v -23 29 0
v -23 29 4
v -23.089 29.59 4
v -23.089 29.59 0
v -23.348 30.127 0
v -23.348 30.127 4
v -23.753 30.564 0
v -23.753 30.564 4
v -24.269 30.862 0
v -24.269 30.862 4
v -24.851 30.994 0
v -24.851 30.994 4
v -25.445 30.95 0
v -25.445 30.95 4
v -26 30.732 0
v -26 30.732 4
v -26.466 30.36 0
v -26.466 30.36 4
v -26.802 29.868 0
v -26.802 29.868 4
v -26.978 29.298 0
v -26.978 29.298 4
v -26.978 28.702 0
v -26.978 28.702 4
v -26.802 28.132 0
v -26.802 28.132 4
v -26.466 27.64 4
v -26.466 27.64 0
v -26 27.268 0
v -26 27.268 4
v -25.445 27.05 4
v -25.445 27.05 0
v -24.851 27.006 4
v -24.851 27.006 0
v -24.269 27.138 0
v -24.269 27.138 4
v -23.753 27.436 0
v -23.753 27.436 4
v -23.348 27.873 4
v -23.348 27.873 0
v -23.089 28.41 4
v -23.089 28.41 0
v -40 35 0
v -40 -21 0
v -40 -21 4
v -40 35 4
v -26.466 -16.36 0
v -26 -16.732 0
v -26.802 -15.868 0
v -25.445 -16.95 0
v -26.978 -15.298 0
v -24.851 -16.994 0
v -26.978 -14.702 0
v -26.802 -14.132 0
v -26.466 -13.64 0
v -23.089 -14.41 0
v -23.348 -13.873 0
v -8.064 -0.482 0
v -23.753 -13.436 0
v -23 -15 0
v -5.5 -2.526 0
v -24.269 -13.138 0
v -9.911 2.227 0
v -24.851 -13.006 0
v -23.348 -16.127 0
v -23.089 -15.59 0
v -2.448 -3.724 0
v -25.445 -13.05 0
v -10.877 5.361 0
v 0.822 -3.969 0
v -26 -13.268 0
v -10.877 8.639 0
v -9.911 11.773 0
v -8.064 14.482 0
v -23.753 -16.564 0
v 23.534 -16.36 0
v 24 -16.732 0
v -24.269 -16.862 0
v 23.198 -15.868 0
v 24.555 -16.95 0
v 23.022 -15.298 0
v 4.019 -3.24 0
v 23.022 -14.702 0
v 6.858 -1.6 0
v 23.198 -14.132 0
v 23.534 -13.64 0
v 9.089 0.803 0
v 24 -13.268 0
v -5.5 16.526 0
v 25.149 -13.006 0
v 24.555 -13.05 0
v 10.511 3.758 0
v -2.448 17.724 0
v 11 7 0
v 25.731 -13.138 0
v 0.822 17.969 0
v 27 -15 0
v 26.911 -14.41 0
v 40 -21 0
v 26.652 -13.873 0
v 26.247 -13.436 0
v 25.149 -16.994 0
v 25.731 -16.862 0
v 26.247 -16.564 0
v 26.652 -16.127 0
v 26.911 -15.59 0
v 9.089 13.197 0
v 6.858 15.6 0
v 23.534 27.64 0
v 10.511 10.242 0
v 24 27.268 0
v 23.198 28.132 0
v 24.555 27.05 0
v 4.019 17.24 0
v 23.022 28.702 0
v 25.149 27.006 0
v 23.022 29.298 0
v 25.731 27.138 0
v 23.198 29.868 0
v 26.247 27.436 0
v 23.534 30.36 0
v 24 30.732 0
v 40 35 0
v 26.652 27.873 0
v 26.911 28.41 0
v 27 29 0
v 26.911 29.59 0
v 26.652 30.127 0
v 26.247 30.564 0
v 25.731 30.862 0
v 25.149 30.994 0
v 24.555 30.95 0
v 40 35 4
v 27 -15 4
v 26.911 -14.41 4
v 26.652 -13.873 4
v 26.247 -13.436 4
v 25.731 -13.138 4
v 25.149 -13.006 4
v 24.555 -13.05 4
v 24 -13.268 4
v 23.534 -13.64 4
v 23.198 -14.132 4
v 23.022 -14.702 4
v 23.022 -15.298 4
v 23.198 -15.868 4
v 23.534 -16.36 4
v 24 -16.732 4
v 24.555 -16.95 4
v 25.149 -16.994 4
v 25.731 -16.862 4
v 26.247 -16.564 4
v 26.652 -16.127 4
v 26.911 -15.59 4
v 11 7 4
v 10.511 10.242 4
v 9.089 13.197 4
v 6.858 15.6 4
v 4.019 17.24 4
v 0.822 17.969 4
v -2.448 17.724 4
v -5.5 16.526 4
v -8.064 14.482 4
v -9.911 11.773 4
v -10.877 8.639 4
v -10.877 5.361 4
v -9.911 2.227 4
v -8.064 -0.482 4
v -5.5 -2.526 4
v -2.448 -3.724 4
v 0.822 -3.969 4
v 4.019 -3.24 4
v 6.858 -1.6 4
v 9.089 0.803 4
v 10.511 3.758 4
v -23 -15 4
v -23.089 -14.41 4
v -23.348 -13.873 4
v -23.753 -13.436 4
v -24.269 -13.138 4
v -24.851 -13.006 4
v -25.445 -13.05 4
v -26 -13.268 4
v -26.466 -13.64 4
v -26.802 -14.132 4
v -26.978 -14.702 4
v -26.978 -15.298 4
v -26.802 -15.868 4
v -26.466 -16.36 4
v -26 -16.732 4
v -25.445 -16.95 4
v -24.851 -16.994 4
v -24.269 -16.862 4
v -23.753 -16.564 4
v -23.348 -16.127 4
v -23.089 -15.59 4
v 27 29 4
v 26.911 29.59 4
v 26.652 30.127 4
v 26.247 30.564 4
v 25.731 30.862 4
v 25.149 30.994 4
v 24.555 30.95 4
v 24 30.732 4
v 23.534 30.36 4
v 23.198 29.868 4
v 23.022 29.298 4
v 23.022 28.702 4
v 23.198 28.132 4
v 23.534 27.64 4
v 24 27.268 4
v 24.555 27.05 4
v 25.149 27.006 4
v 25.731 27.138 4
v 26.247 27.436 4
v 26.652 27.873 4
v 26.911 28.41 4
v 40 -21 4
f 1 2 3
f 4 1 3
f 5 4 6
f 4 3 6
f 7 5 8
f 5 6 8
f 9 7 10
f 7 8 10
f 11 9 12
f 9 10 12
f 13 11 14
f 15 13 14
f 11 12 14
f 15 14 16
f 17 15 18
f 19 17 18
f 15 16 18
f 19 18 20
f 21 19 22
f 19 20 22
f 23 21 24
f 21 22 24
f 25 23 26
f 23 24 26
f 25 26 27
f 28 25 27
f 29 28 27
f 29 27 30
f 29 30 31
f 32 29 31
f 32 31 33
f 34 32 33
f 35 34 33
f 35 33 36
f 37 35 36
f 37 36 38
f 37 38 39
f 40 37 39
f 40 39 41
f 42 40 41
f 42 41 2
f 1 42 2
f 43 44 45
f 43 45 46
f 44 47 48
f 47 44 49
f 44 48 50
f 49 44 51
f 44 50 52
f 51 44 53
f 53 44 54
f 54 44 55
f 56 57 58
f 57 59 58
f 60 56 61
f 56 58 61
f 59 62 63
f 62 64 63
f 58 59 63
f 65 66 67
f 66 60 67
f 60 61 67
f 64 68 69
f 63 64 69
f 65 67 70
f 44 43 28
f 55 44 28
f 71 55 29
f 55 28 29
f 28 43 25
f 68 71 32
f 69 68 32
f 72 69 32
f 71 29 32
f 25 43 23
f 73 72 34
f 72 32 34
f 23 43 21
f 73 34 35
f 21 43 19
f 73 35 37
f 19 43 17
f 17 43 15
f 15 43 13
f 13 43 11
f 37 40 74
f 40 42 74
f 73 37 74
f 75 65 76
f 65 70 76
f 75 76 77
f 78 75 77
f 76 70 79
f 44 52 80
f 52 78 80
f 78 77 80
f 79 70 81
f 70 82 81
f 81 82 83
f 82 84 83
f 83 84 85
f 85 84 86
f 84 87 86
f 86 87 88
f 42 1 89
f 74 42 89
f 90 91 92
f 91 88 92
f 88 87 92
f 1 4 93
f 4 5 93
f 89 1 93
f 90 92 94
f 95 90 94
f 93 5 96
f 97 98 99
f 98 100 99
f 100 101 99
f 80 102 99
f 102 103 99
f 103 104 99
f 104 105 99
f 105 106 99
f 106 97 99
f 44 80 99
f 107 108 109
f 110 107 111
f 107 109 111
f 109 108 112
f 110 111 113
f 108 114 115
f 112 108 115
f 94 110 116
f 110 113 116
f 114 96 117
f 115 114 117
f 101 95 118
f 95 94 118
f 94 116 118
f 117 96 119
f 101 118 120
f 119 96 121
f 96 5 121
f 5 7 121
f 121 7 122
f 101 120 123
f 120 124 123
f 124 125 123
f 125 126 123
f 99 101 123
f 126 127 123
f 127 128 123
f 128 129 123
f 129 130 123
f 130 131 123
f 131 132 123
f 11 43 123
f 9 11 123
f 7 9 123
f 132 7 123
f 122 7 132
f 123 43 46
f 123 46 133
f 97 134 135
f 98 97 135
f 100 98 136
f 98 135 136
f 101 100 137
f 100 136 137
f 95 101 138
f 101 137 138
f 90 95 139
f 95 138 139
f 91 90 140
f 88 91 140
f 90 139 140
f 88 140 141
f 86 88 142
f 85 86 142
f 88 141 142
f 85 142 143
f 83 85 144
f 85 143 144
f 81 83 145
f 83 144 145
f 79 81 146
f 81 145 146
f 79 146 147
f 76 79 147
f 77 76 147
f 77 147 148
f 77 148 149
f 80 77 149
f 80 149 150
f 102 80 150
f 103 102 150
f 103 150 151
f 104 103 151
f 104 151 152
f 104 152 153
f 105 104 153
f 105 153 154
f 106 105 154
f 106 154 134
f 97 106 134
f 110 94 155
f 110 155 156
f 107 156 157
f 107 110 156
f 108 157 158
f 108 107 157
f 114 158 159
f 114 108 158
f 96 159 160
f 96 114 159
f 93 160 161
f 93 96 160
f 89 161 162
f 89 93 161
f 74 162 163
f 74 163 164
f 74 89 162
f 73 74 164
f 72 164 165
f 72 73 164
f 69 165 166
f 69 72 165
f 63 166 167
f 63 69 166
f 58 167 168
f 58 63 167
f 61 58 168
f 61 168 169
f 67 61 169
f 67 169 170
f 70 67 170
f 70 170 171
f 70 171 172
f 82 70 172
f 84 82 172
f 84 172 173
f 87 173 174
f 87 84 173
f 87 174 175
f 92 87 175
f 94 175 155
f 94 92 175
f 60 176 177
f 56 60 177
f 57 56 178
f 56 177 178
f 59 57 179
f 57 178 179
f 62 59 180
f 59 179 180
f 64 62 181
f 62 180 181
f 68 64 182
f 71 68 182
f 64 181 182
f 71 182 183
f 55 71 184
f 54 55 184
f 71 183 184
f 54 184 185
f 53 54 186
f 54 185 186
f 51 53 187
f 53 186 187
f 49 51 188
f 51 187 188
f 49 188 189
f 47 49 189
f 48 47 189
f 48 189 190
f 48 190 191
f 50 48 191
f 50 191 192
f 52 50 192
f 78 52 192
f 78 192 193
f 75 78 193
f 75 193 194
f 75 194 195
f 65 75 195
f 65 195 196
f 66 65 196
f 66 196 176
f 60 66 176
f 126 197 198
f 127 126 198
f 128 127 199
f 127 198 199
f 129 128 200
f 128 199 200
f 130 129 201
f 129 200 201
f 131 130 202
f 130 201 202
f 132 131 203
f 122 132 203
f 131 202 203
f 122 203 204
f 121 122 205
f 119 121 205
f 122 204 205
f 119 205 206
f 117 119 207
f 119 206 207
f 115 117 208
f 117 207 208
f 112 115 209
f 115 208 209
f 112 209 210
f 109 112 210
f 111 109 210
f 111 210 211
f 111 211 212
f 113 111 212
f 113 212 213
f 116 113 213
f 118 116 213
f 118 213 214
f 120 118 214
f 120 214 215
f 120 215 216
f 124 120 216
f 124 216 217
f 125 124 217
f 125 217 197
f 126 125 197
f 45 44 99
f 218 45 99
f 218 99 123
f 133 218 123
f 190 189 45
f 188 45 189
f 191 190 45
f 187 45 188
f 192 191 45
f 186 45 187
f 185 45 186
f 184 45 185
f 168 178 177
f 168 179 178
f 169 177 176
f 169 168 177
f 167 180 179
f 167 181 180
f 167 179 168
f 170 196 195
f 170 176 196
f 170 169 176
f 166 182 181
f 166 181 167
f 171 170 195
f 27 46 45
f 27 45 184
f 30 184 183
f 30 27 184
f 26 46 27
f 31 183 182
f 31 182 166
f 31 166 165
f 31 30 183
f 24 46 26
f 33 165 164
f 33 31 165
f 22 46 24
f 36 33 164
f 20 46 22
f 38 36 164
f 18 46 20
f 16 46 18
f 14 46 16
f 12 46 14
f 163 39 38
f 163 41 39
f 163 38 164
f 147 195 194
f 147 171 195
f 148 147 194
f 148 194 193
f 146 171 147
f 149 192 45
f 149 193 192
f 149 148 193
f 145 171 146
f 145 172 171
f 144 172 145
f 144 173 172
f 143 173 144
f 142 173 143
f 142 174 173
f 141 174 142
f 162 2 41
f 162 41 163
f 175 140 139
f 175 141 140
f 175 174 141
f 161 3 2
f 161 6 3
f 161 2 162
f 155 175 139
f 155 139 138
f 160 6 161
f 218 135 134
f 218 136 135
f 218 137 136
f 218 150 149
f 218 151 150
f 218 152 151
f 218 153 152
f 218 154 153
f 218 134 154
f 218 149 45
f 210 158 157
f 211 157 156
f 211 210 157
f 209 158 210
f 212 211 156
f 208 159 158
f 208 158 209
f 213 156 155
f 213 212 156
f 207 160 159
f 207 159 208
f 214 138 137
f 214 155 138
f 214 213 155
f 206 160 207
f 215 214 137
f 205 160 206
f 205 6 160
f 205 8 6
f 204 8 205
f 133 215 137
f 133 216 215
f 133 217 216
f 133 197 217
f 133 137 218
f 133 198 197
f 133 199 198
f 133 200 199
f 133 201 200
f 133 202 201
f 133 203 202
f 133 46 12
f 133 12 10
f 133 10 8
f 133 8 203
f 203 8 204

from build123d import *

# Parameters (mm, degrees)
SKETCH_1_W                  = 80
SKETCH_1_H                  = 56
SKETCH_1_R                  = 11
EXTRUDE_1_DEPTH             = 4
SKETCH_2_R                  = 2
CUT_EXTRUDE_1_DEPTH         = 100
PATTERN_LINEAR_1_COUNT      = 2
PATTERN_LINEAR_1_PITCH      = 44
PATTERN_LINEAR_1_COUNT_DIR2 = 2
PATTERN_LINEAR_1_PITCH_DIR2 = 50


with BuildPart() as part:
    # 草图1 → 凸台-拉伸1 (new body)
    with BuildSketch(Plane.XY):
        with Locations((0, 7)):
            Rectangle(SKETCH_1_W, SKETCH_1_H)
        with Locations((0, 7)):
            Circle(SKETCH_1_R, mode=Mode.SUBTRACT)
    extrude(amount=EXTRUDE_1_DEPTH)

    # 草图2 → 切除-拉伸1 (cut)
    with BuildSketch(Plane.XY.offset(4)):
        with Locations((-25, -15)):
            Circle(SKETCH_2_R)
    cut_extrude_1 = extrude(amount=-CUT_EXTRUDE_1_DEPTH, mode=Mode.SUBTRACT)

    # 阵列(线性)1: Cut-Extrude 1 2 × 2
    with Locations(*[(j * PATTERN_LINEAR_1_PITCH_DIR2, i * PATTERN_LINEAR_1_PITCH, 0) for i in range(PATTERN_LINEAR_1_COUNT) for j in range(PATTERN_LINEAR_1_COUNT_DIR2) if (i, j) != (0, 0)]):
        add(cut_extrude_1, mode=Mode.SUBTRACT)


solid = part.part
